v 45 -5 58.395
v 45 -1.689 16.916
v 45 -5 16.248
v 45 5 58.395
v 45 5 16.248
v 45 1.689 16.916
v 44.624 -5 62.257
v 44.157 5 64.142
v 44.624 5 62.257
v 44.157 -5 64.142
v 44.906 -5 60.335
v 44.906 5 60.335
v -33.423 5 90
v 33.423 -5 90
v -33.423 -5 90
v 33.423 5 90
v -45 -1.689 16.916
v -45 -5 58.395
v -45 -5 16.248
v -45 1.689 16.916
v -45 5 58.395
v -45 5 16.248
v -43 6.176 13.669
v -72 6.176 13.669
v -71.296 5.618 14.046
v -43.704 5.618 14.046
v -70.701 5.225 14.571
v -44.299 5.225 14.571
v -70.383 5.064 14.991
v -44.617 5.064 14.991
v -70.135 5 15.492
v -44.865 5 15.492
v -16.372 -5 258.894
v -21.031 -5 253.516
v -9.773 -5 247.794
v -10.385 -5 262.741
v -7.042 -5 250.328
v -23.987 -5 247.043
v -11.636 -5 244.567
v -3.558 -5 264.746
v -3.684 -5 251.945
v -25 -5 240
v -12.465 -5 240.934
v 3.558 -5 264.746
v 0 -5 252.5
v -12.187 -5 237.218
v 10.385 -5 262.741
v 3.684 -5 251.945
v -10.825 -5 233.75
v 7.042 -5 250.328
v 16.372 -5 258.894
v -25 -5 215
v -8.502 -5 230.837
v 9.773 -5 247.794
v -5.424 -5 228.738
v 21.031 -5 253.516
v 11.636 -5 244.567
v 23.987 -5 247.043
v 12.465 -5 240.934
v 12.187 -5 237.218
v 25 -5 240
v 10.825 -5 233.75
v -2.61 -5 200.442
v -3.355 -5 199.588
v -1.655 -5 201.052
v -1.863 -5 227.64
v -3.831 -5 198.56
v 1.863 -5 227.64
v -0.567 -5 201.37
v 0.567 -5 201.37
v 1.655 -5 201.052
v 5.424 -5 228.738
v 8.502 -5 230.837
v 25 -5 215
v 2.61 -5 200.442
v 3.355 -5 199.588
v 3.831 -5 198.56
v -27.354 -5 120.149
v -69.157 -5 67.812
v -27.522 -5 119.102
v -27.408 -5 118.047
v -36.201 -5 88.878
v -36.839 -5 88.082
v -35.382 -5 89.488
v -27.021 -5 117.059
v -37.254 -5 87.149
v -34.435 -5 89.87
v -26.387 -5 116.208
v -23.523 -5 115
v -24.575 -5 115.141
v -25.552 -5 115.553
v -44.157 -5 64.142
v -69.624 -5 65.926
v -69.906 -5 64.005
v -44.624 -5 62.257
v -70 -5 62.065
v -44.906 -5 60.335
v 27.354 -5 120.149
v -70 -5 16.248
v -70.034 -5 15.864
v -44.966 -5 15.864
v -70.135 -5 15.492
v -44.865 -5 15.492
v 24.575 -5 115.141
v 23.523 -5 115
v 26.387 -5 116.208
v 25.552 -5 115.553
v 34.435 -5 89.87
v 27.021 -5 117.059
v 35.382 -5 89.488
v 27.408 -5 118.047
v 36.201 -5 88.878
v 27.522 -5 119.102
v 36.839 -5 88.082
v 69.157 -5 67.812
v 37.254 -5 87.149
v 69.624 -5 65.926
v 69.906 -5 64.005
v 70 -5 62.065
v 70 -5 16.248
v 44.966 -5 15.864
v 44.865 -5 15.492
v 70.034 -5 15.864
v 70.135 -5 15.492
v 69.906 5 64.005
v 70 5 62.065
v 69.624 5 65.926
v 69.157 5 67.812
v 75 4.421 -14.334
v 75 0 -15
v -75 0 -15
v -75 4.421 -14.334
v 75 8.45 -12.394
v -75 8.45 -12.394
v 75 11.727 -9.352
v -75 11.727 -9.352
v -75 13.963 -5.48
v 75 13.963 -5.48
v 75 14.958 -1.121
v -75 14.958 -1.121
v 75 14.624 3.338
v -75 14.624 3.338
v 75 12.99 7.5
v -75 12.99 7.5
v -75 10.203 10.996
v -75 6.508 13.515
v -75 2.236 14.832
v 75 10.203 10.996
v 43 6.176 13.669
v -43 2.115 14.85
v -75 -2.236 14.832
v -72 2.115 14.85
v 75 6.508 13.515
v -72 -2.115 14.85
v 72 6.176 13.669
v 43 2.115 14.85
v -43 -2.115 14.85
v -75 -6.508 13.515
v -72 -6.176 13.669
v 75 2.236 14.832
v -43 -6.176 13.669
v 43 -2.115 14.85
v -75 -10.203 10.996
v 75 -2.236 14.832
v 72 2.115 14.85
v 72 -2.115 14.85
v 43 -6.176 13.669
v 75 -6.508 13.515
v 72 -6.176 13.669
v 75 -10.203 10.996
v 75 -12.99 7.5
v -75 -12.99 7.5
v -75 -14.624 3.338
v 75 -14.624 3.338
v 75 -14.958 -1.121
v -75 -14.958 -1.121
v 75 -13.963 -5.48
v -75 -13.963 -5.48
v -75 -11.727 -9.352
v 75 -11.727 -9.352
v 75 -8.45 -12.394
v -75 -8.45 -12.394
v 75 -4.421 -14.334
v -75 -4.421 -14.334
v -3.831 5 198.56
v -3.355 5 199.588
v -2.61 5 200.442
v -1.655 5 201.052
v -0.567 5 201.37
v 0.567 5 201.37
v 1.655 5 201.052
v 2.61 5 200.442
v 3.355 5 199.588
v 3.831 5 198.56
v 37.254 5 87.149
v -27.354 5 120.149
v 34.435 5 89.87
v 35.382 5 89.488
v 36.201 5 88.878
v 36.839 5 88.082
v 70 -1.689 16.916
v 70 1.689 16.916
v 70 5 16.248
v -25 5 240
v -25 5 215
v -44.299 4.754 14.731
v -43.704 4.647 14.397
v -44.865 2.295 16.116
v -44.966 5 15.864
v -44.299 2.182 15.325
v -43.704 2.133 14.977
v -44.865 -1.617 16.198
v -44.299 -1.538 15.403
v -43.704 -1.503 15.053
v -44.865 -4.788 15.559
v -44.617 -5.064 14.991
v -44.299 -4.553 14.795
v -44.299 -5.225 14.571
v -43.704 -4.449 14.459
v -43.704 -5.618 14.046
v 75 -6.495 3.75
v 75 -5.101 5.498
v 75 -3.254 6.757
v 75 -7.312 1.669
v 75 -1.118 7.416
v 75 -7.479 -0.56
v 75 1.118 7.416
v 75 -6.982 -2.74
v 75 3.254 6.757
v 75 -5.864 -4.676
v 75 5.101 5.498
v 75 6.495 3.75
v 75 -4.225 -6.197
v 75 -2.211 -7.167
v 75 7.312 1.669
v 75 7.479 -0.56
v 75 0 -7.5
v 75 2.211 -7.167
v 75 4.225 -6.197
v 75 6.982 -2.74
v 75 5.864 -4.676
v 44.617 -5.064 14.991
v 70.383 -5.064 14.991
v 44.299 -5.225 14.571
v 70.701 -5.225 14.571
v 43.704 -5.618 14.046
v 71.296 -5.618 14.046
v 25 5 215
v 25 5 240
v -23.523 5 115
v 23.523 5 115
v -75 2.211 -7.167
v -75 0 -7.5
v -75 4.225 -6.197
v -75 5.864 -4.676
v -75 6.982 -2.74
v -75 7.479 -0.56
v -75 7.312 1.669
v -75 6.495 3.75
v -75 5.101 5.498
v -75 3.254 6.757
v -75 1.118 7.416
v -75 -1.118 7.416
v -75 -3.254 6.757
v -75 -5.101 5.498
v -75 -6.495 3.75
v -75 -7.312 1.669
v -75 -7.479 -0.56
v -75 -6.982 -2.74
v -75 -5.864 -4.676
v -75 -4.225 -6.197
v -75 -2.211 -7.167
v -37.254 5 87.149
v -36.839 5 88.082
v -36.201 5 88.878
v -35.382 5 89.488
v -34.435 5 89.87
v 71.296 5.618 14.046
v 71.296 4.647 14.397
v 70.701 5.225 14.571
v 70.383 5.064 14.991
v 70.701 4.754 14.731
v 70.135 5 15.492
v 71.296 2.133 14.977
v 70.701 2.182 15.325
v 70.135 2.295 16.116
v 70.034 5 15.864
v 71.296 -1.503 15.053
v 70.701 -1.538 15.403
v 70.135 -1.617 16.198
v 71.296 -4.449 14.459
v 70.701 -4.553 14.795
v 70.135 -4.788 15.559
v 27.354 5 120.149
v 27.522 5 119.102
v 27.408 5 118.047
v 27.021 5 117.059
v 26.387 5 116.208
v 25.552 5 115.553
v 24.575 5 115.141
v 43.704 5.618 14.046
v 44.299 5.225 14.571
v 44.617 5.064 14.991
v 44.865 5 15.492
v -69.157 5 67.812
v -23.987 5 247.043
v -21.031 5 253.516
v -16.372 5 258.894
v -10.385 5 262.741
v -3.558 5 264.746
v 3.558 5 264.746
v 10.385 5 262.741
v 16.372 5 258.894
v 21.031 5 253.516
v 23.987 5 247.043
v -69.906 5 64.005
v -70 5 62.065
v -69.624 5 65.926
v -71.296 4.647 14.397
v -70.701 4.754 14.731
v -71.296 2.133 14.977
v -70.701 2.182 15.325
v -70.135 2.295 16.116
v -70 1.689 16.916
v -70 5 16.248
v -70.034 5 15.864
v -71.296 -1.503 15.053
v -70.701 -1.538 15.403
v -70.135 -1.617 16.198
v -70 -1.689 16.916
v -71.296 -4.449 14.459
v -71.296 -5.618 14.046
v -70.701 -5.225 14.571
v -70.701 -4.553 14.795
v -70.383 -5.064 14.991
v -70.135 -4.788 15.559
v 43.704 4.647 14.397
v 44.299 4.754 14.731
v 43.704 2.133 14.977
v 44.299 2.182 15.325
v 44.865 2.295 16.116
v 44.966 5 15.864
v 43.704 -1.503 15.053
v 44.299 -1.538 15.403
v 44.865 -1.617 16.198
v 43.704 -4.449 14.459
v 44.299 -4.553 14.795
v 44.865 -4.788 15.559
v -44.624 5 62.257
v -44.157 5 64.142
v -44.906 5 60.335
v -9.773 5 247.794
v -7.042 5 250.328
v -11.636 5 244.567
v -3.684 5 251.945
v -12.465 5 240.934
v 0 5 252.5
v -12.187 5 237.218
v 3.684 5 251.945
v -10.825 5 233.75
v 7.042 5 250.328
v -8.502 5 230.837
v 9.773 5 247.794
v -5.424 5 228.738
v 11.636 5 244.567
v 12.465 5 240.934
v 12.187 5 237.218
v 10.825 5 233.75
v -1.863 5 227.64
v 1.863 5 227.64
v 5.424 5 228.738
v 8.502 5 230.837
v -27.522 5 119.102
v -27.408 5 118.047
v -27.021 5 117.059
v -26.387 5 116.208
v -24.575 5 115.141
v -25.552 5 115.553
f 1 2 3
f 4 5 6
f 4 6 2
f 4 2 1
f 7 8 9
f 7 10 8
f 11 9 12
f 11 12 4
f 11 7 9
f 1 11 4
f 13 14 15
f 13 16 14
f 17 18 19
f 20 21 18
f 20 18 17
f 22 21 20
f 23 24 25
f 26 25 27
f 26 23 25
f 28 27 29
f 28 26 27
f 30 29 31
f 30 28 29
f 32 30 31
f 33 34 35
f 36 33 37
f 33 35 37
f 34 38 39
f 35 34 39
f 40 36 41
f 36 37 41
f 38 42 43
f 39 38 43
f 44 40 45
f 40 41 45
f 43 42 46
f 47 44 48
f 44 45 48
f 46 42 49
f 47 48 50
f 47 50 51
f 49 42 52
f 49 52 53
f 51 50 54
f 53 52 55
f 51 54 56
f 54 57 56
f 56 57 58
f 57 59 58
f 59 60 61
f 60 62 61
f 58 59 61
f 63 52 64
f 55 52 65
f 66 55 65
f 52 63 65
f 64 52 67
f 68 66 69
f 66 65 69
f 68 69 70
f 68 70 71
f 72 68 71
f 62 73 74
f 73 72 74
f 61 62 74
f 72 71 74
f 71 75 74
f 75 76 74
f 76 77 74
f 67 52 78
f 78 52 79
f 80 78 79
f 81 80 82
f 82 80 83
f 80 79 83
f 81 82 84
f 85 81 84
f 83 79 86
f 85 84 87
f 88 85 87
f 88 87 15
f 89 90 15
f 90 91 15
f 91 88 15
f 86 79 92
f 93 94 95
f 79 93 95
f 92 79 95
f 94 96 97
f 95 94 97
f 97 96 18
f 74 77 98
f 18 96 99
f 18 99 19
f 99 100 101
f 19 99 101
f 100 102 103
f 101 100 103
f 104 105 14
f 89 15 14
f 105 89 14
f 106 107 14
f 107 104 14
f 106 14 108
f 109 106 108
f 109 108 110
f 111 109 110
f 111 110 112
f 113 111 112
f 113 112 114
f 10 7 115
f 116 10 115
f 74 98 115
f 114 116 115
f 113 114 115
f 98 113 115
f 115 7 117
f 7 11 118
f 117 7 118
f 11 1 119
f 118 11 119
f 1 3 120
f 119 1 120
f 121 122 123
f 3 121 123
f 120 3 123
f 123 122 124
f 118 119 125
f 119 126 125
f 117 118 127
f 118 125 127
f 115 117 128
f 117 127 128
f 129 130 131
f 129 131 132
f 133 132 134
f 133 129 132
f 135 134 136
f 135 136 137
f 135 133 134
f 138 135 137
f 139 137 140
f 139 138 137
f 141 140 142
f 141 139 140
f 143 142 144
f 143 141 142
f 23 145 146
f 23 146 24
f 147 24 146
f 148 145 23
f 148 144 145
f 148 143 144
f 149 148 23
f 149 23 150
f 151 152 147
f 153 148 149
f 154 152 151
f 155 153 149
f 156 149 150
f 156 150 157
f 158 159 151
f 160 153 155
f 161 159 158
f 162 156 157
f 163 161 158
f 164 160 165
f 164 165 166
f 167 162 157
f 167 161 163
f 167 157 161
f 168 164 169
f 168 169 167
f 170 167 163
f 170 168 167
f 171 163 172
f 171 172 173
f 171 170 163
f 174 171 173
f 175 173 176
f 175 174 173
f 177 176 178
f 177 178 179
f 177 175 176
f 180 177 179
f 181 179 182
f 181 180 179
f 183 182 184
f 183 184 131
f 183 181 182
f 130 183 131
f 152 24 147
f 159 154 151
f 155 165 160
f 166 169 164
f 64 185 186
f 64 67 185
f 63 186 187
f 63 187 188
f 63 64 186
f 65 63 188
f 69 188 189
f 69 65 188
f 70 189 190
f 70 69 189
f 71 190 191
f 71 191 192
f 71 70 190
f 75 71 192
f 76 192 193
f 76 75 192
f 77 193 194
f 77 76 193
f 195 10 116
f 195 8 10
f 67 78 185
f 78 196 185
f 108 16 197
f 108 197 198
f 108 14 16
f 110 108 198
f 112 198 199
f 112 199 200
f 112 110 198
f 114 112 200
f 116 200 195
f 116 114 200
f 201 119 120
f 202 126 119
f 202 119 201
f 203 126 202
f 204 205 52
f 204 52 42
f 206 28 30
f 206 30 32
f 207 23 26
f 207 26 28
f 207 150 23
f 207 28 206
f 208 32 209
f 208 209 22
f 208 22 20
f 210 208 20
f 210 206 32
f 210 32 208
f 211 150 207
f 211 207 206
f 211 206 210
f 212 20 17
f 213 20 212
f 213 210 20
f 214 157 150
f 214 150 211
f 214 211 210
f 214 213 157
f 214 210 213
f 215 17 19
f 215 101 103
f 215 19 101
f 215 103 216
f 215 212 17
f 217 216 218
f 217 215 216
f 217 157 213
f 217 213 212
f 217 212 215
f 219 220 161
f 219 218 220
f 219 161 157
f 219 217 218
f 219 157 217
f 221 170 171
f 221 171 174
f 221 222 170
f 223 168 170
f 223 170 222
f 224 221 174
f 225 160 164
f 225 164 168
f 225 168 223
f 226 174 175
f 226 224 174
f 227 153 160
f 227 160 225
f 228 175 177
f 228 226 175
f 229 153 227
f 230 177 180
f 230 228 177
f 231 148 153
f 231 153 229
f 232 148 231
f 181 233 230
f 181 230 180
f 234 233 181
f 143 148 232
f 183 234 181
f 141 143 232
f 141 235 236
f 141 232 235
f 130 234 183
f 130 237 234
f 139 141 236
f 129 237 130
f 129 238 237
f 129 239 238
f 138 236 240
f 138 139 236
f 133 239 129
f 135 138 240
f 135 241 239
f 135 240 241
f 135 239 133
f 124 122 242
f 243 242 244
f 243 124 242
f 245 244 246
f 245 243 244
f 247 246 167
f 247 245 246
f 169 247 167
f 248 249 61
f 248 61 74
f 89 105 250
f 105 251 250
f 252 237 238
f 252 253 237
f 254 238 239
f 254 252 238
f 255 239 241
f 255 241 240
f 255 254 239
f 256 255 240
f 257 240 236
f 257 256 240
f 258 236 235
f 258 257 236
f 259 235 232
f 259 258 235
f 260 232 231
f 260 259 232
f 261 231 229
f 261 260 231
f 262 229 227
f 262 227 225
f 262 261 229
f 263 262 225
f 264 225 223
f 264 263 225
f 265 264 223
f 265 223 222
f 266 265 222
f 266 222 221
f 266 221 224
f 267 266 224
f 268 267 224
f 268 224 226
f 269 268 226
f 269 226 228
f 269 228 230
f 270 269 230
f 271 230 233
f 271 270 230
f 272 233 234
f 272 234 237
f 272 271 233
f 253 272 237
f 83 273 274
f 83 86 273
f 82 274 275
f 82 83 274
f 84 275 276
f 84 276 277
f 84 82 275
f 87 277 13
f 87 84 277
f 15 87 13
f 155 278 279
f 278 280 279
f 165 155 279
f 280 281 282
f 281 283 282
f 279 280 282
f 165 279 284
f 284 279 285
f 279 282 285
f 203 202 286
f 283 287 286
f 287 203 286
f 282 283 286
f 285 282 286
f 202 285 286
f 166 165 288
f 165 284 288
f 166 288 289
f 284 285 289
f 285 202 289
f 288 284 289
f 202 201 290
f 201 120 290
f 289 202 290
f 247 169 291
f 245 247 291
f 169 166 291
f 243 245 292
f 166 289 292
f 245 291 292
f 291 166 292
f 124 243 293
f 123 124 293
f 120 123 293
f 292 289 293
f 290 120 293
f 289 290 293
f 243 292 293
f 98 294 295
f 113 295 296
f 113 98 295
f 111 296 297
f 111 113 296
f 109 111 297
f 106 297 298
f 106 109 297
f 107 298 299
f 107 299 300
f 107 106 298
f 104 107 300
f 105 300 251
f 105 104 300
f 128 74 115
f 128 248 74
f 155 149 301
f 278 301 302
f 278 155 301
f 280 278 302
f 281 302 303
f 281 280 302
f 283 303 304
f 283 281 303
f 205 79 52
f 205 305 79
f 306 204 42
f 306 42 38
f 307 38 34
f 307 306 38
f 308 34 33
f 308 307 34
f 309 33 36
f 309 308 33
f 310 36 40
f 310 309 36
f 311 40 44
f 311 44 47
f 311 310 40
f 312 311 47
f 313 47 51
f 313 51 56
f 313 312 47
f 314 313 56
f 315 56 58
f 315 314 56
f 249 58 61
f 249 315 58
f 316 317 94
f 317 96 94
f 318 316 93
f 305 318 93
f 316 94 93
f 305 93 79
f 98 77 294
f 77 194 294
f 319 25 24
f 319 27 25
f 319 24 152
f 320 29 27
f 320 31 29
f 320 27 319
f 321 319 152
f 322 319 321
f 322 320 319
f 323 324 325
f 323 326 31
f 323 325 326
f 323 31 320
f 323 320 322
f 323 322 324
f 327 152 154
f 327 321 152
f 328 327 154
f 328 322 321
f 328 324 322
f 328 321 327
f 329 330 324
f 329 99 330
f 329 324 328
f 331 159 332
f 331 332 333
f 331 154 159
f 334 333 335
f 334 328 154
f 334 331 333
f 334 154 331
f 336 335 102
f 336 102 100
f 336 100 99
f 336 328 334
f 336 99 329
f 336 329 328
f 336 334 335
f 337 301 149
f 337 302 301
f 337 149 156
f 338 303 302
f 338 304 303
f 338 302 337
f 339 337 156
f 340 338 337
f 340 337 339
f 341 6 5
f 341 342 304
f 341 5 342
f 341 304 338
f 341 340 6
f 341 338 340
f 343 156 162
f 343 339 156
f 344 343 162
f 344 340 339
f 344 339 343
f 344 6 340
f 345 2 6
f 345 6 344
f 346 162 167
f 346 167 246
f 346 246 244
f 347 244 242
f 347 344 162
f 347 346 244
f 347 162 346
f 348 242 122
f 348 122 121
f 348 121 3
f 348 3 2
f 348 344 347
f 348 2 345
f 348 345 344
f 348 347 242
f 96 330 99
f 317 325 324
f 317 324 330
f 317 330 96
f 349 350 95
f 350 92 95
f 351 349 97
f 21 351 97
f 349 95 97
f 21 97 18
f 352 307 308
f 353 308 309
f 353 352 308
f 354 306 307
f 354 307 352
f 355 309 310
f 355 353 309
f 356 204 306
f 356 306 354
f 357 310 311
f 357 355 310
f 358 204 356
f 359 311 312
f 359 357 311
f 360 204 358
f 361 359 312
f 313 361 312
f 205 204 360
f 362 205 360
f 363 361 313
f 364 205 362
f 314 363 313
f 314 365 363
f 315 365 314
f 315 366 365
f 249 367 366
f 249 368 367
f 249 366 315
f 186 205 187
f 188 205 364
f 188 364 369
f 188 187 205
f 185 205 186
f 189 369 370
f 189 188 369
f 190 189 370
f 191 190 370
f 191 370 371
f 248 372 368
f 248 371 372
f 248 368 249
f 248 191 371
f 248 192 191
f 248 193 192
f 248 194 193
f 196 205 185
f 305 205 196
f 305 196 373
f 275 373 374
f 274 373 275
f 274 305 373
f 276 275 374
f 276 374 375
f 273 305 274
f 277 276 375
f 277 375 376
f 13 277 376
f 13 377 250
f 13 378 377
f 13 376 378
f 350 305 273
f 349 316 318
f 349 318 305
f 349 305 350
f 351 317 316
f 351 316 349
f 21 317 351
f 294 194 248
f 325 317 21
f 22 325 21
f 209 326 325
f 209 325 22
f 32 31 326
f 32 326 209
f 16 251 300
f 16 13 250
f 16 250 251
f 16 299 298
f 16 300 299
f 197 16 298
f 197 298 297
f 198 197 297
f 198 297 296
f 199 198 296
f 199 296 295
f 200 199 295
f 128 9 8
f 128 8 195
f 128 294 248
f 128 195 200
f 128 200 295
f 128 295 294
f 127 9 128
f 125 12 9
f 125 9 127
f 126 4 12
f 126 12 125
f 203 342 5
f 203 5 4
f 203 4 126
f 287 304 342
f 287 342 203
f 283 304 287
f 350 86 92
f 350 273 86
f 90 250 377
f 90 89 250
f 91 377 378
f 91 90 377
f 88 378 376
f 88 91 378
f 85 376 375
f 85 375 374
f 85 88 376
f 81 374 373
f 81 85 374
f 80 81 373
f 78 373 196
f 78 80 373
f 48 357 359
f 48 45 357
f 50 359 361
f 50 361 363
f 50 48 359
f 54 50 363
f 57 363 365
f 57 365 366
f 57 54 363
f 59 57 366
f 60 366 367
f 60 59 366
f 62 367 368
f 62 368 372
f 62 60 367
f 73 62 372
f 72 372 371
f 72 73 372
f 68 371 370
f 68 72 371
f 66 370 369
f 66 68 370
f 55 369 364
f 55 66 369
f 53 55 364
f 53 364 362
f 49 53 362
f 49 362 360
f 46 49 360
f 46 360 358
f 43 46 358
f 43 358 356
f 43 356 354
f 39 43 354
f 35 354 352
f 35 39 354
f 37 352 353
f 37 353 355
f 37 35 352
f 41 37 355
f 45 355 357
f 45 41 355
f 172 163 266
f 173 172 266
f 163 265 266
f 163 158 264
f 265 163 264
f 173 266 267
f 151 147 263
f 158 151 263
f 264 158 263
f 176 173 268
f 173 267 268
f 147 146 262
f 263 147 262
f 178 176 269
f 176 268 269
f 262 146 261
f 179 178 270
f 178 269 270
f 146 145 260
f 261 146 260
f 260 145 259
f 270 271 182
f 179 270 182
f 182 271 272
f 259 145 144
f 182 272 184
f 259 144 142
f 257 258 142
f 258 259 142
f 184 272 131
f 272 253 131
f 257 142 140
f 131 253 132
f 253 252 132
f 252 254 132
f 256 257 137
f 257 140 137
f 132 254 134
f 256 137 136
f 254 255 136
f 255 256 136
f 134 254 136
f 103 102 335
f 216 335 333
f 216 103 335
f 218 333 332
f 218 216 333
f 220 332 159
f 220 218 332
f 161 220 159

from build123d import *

# Parameters (mm, degrees)
SKETCH_1_R      = 15
SKETCH_1_R_2    = 7.5
EXTRUDE_1_DEPTH = 75
SKETCH_2_R      = 12.5
EXTRUDE_2_DEPTH = 5
FILLET_1_R      = 4
FILLET_2_R      = 20
FILLET_3_R      = 2


with BuildPart() as part:
    # 스케치1 → 보스-돌출1 (new, symmetric)
    with BuildSketch(Plane(origin=(0, 0, 0), x_dir=(0, 0, -1), z_dir=(1, 0, 0))):
        Circle(SKETCH_1_R)
        Circle(SKETCH_1_R_2, mode=Mode.SUBTRACT)
    extrude(amount=EXTRUDE_1_DEPTH, both=True)

    # 스케치2 → 보스-돌출2 (add, symmetric)
    with BuildSketch(Plane(origin=(0, 0, 0), x_dir=(1, 0, 0), z_dir=(0, 1, 0))):
        with BuildLine():
            Line((-70, -65), (-25, -215))
            Line((-25, -215), (-25, -240))
            ThreePointArc((-25, -240), (0, -265), (25, -240))
            Line((25, -240), (25, -215))
            Line((25, -215), (70, -65))
            Line((70, -65), (70, -12))
            Line((70, -12), (45, -12))
            Line((45, -12), (45, -61.330779092))
            Line((45, -61.330779092), (36.399233728, -90))
            Line((36.399233728, -90), (-36.399233728, -90))
            Line((-36.399233728, -90), (-45, -61.330779092))
            Line((-45, -61.330779092), (-45, -12))
            Line((-45, -12), (-70, -12))
            Line((-70, -12), (-70, -65))
        make_face()
        with Locations(Location((0, -240, 0), (0, 0, 270))):
            Circle(SKETCH_2_R, mode=Mode.SUBTRACT)
        with BuildLine():
            Line((3.831305141, -198.559761956), (28.899233728, -115))
            Line((28.899233728, -115), (-28.899233728, -115))
            Line((-28.899233728, -115), (-3.831305141, -198.559761956))
            ThreePointArc((-3.831305141, -198.559761956), (0, -201.410370414), (3.831305141, -198.559761956))
        make_face(mode=Mode.SUBTRACT)
    extrude(amount=EXTRUDE_2_DEPTH, both=True)

    # 필렛1
    fillet_1_edges = [part.edges().sort_by_distance(p)[0] for p in [
        (36.399233728, 0, 90),
        (-36.399233728, 0, 90),
        (28.899233728, 0, 115),
        (-28.899233728, 0, 115),
    ]]
    fillet(fillet_1_edges, radius=FILLET_1_R)

    # 필렛2
    fillet_2_edges = [part.edges().sort_by_distance(p)[0] for p in [
        (-70, 0, 65),
        (70, 0, 65),
        (45, 0, 61.330779092),
        (-45, 0, 61.330779092),
    ]]
    fillet(fillet_2_edges, radius=FILLET_2_R)

    # 필렛3
    fillet_3_edges = [part.edges().sort_by_distance(p)[0] for p in [
        (-45, 0, 15),
        (-57.5, -5, 14.142135624),
        (-57.5, 5, 14.142135624),
        (-70, 0, 15),
        (45, 0, 15),
        (57.5, -5, 14.142135624),
        (57.5, 5, 14.142135624),
        (70, 0, 15),
    ]]
    fillet(fillet_3_edges, radius=FILLET_3_R)


solid = part.part
